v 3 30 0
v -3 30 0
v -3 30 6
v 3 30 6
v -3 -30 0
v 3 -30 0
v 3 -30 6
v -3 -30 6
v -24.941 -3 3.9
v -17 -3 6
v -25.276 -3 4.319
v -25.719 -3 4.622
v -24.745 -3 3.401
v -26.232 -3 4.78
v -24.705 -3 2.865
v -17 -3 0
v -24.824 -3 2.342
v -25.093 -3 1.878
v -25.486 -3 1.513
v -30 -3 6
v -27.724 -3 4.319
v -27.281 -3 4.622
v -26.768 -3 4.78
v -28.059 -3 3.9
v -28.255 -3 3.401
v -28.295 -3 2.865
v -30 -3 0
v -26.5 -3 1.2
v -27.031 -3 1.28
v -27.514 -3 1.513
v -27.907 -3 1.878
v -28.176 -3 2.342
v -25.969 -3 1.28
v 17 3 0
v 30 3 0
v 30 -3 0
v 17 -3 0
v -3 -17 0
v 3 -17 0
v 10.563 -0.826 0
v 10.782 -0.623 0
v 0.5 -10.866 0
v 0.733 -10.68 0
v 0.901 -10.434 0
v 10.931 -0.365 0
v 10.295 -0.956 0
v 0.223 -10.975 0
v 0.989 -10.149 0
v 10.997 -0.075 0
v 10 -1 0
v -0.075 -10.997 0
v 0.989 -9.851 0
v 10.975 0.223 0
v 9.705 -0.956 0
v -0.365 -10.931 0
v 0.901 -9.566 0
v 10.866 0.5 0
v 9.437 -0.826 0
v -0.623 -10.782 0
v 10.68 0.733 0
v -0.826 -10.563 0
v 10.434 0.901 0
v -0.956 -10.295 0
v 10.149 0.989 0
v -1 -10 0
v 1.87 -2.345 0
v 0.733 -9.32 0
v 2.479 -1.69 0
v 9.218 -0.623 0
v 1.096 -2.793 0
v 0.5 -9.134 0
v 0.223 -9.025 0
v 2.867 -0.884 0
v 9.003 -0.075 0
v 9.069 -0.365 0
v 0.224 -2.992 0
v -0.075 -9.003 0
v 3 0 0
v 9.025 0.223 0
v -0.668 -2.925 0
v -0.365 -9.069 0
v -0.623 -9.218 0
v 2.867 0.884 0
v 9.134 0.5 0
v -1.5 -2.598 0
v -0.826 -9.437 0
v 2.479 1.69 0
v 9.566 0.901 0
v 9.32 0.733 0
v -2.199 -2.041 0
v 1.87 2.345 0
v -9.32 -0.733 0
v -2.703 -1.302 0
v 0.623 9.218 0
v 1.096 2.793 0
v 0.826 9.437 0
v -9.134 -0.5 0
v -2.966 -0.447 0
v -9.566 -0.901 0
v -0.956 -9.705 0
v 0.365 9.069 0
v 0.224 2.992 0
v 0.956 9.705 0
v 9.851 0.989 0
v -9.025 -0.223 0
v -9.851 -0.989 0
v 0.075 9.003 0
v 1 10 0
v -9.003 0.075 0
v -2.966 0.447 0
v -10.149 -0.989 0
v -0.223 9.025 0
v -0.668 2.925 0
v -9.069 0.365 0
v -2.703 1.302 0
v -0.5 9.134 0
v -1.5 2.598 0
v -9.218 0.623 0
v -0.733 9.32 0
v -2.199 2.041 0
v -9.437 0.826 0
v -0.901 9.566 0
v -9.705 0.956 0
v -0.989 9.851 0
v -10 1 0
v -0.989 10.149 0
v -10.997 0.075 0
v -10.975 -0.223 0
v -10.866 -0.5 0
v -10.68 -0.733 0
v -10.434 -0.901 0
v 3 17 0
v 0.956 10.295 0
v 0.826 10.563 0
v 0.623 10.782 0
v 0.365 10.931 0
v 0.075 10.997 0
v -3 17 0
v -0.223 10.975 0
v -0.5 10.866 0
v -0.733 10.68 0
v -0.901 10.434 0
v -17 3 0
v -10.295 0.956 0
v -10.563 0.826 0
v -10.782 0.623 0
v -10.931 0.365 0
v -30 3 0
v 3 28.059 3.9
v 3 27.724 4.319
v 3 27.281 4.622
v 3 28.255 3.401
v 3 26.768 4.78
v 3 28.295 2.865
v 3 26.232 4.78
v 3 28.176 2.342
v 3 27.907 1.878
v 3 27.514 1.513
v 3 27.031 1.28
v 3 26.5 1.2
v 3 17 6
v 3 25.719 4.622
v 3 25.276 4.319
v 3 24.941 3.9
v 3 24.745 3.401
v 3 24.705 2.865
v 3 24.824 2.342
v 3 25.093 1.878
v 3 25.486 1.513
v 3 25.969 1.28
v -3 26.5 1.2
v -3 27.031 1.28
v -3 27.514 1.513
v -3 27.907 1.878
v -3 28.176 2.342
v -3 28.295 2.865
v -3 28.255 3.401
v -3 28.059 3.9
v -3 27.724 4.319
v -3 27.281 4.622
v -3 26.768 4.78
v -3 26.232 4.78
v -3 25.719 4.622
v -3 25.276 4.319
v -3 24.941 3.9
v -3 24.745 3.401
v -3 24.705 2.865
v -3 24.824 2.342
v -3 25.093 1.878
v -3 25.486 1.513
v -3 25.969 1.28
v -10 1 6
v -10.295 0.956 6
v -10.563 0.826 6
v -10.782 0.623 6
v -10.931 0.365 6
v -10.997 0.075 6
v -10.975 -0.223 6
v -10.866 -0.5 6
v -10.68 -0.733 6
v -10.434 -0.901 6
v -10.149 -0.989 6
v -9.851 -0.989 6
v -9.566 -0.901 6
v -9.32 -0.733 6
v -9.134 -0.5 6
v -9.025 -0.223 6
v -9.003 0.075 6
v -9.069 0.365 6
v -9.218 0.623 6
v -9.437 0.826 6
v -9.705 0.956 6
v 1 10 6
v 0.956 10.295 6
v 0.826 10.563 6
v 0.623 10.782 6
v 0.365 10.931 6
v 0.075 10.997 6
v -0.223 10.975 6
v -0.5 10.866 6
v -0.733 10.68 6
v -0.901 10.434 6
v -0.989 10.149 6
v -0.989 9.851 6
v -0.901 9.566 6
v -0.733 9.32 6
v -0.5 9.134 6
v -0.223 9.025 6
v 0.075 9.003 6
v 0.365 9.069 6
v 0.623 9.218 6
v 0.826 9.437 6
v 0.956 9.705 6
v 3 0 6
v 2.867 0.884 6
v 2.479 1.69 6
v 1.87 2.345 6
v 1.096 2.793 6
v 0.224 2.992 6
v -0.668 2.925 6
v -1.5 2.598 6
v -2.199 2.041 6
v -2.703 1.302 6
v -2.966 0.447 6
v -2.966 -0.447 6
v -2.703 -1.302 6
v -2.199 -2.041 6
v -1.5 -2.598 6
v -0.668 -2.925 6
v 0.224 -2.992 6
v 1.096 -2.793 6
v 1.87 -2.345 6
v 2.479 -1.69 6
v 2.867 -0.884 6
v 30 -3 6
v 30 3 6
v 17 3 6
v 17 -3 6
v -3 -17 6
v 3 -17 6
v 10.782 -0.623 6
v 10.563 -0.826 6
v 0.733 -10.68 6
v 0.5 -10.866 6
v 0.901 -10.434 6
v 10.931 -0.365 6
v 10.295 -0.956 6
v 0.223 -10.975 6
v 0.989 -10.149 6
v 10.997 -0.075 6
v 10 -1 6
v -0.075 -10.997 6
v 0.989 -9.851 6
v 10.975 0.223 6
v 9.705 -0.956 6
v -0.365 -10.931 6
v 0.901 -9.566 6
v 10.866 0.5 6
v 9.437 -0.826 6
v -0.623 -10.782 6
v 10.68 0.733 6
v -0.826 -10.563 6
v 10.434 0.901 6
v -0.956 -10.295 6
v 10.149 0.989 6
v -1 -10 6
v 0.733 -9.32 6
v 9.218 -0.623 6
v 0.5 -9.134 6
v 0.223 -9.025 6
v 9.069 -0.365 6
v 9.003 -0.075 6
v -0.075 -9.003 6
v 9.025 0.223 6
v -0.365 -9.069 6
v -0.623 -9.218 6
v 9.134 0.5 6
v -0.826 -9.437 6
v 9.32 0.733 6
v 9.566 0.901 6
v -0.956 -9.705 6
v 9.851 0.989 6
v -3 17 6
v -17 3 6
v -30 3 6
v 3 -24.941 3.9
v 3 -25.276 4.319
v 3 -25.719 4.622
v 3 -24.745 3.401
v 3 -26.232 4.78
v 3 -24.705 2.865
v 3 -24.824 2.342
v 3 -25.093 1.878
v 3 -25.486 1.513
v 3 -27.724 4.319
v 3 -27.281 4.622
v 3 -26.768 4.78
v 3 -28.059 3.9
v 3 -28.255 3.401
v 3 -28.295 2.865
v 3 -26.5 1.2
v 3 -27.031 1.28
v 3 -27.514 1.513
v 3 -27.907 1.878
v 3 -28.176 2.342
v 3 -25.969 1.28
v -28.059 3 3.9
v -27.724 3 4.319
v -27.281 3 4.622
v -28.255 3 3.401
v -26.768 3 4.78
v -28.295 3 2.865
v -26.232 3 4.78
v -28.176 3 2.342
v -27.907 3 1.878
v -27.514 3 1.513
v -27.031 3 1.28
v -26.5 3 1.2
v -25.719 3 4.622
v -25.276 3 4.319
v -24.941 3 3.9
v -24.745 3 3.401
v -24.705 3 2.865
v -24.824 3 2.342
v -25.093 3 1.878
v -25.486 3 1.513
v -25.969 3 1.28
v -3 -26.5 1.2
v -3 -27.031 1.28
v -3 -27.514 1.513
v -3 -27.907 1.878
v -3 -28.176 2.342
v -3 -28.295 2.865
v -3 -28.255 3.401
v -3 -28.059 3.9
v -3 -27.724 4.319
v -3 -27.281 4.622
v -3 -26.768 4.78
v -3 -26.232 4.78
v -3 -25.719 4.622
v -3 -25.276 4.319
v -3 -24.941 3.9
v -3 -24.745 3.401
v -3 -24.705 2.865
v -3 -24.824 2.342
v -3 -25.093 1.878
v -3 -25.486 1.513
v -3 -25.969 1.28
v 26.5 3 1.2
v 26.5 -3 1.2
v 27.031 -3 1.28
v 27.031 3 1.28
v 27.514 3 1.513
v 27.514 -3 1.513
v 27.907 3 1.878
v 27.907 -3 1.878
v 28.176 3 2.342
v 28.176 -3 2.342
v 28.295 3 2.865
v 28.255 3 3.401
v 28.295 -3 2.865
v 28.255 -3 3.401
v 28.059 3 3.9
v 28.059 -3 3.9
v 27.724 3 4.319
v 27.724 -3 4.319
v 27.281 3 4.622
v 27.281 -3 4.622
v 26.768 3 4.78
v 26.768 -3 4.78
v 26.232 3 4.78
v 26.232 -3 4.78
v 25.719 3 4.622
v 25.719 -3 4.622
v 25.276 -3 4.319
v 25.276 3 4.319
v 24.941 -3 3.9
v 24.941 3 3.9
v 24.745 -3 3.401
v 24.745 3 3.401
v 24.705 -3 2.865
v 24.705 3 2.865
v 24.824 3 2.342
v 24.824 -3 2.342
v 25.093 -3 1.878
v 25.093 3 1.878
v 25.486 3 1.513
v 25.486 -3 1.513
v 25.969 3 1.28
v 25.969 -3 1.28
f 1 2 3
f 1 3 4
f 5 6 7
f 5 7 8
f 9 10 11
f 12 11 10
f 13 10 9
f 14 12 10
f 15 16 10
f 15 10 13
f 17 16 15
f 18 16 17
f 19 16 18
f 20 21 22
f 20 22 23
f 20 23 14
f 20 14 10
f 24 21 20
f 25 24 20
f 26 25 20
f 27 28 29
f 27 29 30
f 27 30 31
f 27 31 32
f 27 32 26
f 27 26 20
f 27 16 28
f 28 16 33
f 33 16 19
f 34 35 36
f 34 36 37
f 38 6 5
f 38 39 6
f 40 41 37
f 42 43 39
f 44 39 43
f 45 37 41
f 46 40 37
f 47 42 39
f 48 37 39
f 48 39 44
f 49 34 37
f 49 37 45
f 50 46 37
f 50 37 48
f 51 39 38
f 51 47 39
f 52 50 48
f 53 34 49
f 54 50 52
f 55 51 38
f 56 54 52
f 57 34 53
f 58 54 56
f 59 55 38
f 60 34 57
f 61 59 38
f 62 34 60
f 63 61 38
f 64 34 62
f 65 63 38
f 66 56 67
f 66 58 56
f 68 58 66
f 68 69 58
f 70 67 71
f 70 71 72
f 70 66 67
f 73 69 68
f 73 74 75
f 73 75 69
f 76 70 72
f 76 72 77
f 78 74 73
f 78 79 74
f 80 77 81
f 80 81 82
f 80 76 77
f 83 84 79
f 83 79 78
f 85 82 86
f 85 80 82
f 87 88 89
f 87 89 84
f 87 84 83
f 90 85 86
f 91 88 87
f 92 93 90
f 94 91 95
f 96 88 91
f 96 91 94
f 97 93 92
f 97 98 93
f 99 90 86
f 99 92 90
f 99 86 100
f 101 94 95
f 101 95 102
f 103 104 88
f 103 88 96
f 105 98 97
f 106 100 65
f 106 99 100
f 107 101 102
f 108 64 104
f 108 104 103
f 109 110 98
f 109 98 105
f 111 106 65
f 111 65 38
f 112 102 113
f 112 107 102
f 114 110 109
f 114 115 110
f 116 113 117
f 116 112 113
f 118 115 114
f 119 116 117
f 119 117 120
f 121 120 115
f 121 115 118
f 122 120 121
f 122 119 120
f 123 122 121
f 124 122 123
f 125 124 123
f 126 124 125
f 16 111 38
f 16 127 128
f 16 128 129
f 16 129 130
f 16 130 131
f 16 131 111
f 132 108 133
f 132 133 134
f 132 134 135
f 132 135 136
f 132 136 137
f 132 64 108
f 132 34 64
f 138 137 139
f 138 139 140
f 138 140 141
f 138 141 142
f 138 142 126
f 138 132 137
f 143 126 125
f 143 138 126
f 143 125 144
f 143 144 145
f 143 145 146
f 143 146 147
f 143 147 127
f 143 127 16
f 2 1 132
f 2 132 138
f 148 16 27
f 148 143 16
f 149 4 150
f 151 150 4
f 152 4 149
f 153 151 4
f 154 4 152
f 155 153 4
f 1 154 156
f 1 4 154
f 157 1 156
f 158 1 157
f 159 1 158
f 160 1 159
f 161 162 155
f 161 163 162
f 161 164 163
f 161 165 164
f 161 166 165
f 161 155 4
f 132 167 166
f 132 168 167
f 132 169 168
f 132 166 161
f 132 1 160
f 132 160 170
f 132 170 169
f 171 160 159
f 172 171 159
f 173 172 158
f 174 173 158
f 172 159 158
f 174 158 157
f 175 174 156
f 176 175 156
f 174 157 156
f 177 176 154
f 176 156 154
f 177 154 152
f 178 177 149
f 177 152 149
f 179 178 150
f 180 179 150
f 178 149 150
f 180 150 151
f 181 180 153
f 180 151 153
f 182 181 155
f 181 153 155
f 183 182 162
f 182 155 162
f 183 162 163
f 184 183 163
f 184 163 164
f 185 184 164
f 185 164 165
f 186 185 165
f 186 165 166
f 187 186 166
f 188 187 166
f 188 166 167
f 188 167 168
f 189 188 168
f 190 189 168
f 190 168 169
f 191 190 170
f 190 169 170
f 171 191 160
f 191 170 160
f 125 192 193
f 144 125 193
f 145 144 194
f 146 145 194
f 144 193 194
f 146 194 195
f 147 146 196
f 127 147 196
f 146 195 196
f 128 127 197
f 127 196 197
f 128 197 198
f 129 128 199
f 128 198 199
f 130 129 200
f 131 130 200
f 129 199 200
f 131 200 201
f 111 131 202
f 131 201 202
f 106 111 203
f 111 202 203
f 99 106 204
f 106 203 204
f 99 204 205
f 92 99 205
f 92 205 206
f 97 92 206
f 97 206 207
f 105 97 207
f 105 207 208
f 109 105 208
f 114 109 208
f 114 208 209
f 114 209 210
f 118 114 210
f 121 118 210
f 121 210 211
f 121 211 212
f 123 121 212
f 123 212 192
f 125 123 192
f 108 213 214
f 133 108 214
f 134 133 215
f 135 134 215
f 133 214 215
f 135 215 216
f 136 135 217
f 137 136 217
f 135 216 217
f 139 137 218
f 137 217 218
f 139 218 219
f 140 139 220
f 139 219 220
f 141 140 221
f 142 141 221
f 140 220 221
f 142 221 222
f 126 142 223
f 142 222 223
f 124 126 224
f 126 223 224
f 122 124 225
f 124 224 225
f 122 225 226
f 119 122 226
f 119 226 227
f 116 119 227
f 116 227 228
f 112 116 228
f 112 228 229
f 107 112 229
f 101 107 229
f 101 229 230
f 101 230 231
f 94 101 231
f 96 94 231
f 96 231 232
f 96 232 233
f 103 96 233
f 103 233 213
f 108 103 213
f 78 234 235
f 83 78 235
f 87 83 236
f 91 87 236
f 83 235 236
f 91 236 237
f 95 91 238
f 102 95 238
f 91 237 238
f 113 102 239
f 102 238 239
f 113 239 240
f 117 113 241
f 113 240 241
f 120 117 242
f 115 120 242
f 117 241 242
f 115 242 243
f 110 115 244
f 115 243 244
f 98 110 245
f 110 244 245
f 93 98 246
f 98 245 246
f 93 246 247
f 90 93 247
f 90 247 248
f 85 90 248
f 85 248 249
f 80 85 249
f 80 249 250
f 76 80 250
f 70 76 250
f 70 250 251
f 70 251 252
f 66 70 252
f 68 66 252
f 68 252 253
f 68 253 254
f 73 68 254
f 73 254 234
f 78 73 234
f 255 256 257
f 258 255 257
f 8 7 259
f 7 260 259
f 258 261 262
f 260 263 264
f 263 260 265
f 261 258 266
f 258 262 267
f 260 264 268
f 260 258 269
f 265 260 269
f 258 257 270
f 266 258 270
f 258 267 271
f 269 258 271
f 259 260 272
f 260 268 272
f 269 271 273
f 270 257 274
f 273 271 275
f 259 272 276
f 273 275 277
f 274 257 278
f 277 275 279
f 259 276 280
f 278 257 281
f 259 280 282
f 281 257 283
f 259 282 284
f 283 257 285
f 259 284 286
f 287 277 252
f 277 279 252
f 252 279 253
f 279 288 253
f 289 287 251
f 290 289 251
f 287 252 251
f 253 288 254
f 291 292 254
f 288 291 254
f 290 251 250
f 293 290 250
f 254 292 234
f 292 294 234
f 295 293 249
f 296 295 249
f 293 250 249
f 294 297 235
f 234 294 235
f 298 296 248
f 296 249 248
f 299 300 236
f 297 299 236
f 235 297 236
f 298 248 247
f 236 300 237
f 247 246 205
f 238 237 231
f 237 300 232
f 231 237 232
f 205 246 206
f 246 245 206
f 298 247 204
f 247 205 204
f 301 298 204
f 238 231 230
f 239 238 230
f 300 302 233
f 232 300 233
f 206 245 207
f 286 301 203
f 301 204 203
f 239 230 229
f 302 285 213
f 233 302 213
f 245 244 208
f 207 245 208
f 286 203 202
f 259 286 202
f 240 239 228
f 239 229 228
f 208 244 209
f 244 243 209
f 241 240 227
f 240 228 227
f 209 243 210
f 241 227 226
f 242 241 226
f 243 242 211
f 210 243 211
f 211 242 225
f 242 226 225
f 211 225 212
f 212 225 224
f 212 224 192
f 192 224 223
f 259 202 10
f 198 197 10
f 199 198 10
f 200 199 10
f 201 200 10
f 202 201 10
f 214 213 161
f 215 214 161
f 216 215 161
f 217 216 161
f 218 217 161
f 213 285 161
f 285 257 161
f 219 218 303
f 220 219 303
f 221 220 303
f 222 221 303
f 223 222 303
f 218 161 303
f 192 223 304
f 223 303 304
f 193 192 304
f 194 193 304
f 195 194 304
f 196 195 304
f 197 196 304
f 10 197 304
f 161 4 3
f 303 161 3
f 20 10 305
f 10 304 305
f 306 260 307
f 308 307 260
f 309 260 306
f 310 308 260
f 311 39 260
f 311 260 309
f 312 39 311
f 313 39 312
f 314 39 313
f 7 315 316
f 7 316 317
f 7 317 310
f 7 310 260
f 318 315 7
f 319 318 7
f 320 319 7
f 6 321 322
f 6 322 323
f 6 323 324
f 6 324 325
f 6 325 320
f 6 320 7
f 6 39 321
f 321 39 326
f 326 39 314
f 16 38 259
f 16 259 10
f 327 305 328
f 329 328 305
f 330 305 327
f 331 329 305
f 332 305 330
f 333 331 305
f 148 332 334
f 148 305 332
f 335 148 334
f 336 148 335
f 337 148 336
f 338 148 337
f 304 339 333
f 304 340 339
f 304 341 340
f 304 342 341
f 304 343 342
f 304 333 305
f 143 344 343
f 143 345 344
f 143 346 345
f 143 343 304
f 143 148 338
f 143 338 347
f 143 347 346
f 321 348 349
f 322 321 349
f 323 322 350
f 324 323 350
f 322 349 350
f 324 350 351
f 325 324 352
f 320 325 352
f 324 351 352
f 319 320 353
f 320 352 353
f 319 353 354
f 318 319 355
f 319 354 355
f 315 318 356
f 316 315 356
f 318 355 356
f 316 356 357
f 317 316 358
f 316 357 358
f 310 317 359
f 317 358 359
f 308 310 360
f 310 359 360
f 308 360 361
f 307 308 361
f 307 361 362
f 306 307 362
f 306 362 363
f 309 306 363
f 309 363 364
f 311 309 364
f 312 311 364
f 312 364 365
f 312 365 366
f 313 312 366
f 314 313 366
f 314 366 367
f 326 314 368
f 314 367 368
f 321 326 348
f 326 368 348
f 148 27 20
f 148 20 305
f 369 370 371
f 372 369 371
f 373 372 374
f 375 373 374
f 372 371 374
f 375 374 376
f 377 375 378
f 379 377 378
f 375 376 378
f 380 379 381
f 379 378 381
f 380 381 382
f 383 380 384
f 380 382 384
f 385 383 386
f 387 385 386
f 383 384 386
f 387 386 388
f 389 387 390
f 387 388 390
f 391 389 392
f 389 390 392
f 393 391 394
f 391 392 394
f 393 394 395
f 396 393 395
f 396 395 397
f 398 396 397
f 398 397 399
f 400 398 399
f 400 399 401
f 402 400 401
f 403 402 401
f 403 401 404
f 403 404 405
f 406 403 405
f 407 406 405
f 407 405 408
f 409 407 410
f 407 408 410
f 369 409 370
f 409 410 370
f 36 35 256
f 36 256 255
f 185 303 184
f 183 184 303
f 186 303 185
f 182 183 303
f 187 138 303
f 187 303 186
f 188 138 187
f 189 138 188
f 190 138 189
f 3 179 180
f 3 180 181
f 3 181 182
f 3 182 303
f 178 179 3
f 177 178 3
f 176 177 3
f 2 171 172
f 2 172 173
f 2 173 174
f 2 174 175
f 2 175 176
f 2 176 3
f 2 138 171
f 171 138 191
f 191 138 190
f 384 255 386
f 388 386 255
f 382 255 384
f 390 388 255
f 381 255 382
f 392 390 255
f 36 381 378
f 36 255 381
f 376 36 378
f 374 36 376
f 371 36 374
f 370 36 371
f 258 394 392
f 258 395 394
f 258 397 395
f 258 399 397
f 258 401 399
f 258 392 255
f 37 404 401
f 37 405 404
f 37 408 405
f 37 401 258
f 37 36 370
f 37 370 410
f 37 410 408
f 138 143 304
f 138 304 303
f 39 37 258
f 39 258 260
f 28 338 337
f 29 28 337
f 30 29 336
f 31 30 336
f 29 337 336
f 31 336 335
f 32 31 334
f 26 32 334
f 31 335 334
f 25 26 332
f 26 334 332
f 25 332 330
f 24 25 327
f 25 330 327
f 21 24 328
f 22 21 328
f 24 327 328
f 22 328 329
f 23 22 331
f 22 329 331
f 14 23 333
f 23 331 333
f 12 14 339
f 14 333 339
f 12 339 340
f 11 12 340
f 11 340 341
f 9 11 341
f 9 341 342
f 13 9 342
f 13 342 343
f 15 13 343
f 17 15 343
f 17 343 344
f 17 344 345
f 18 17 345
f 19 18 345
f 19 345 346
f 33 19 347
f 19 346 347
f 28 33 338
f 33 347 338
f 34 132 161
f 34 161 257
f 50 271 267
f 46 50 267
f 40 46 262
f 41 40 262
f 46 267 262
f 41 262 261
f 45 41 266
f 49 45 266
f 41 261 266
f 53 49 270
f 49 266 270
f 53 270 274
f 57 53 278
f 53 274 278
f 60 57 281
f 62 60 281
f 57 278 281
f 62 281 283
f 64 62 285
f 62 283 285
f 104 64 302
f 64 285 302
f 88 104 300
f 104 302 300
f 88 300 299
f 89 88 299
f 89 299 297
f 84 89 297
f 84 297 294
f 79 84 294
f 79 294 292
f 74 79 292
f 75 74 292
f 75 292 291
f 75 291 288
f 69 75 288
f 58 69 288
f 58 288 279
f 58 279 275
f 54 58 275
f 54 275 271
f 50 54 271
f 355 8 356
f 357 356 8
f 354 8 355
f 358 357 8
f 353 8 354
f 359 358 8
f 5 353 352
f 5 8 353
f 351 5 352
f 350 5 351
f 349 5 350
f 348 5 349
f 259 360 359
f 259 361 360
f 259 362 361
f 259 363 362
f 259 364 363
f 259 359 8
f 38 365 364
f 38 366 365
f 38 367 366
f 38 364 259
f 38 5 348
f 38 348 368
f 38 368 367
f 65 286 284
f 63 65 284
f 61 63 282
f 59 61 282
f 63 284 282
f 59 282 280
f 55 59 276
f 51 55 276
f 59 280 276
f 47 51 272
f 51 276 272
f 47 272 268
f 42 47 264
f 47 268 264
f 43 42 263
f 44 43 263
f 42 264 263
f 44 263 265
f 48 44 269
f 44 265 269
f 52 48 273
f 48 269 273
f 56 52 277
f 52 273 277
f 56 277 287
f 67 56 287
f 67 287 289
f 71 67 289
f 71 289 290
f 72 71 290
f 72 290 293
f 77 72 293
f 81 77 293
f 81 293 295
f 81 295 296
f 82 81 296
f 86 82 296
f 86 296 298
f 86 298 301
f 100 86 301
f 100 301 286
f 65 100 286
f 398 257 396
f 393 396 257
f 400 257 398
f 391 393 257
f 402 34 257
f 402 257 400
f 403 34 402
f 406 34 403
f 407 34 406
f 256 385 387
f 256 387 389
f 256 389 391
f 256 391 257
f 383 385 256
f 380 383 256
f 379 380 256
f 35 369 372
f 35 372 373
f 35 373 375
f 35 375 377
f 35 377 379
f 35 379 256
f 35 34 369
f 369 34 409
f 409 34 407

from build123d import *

# Parameters (mm, degrees)
BOSS_EXTRUDE1_DEPTH = 6
SKETCH2_R           = 1.8
CUT_EXTRUDE1_DEPTH  = 6
CIRPATTERN1_COUNT   = 4
SKETCH3_R           = 3
CUT_EXTRUDE2_DEPTH  = 7
SKETCH4_R           = 1
CUT_EXTRUDE3_DEPTH  = 10
CIRPATTERN2_COUNT   = 4


with BuildPart() as part:
    # Sketch1 → Boss-Extrude1 (new body)
    with BuildSketch(Plane.XY):
        Polygon((3, -30), (-3, -30), (-3, -17), (-17, -3), (-30, -3), (-30, 3), (-17, 3), (-3, 17), (-3, 30), (3, 30), (3, 17), (17, 3), (30, 3), (30, -3), (17, -3), (3, -17), align=None)
    extrude(amount=BOSS_EXTRUDE1_DEPTH)

    # Sketch2 → Cut-Extrude1 (cut)
    with BuildSketch(Plane(origin=(3, 0, 0), x_dir=(0, 0, -1), z_dir=(1, 0, 0))):
        with Locations((-3, 26.5)):
            Circle(SKETCH2_R)
    cut_extrude1 = extrude(amount=-CUT_EXTRUDE1_DEPTH, mode=Mode.SUBTRACT)

    # CirPattern1: Cut-Extrude1 ×4 about axis
    cirpattern1_axis = Axis((0, 0, 0), (0, 0, 1))
    for i in range(1, CIRPATTERN1_COUNT):
        add(cut_extrude1.rotate(cirpattern1_axis, i * 360 / CIRPATTERN1_COUNT), mode=Mode.SUBTRACT)

    # Sketch3 → Cut-Extrude2 (cut, through all)
    with BuildSketch(Plane.XY.offset(6)):
        Circle(SKETCH3_R)
    extrude(amount=-CUT_EXTRUDE2_DEPTH, mode=Mode.SUBTRACT)

    # Sketch4 → Cut-Extrude3 (cut)
    with BuildSketch(Plane.XY.offset(6)):
        with Locations((0, 10)):
            Circle(SKETCH4_R)
    cut_extrude3 = extrude(amount=-CUT_EXTRUDE3_DEPTH, mode=Mode.SUBTRACT)

    # CirPattern2: Cut-Extrude3 ×4 about axis
    cirpattern2_axis = Axis((0, 0, 0), (0, 0, 1))
    for i in range(1, CIRPATTERN2_COUNT):
        add(cut_extrude3.rotate(cirpattern2_axis, i * 360 / CIRPATTERN2_COUNT), mode=Mode.SUBTRACT)


solid = part.part
